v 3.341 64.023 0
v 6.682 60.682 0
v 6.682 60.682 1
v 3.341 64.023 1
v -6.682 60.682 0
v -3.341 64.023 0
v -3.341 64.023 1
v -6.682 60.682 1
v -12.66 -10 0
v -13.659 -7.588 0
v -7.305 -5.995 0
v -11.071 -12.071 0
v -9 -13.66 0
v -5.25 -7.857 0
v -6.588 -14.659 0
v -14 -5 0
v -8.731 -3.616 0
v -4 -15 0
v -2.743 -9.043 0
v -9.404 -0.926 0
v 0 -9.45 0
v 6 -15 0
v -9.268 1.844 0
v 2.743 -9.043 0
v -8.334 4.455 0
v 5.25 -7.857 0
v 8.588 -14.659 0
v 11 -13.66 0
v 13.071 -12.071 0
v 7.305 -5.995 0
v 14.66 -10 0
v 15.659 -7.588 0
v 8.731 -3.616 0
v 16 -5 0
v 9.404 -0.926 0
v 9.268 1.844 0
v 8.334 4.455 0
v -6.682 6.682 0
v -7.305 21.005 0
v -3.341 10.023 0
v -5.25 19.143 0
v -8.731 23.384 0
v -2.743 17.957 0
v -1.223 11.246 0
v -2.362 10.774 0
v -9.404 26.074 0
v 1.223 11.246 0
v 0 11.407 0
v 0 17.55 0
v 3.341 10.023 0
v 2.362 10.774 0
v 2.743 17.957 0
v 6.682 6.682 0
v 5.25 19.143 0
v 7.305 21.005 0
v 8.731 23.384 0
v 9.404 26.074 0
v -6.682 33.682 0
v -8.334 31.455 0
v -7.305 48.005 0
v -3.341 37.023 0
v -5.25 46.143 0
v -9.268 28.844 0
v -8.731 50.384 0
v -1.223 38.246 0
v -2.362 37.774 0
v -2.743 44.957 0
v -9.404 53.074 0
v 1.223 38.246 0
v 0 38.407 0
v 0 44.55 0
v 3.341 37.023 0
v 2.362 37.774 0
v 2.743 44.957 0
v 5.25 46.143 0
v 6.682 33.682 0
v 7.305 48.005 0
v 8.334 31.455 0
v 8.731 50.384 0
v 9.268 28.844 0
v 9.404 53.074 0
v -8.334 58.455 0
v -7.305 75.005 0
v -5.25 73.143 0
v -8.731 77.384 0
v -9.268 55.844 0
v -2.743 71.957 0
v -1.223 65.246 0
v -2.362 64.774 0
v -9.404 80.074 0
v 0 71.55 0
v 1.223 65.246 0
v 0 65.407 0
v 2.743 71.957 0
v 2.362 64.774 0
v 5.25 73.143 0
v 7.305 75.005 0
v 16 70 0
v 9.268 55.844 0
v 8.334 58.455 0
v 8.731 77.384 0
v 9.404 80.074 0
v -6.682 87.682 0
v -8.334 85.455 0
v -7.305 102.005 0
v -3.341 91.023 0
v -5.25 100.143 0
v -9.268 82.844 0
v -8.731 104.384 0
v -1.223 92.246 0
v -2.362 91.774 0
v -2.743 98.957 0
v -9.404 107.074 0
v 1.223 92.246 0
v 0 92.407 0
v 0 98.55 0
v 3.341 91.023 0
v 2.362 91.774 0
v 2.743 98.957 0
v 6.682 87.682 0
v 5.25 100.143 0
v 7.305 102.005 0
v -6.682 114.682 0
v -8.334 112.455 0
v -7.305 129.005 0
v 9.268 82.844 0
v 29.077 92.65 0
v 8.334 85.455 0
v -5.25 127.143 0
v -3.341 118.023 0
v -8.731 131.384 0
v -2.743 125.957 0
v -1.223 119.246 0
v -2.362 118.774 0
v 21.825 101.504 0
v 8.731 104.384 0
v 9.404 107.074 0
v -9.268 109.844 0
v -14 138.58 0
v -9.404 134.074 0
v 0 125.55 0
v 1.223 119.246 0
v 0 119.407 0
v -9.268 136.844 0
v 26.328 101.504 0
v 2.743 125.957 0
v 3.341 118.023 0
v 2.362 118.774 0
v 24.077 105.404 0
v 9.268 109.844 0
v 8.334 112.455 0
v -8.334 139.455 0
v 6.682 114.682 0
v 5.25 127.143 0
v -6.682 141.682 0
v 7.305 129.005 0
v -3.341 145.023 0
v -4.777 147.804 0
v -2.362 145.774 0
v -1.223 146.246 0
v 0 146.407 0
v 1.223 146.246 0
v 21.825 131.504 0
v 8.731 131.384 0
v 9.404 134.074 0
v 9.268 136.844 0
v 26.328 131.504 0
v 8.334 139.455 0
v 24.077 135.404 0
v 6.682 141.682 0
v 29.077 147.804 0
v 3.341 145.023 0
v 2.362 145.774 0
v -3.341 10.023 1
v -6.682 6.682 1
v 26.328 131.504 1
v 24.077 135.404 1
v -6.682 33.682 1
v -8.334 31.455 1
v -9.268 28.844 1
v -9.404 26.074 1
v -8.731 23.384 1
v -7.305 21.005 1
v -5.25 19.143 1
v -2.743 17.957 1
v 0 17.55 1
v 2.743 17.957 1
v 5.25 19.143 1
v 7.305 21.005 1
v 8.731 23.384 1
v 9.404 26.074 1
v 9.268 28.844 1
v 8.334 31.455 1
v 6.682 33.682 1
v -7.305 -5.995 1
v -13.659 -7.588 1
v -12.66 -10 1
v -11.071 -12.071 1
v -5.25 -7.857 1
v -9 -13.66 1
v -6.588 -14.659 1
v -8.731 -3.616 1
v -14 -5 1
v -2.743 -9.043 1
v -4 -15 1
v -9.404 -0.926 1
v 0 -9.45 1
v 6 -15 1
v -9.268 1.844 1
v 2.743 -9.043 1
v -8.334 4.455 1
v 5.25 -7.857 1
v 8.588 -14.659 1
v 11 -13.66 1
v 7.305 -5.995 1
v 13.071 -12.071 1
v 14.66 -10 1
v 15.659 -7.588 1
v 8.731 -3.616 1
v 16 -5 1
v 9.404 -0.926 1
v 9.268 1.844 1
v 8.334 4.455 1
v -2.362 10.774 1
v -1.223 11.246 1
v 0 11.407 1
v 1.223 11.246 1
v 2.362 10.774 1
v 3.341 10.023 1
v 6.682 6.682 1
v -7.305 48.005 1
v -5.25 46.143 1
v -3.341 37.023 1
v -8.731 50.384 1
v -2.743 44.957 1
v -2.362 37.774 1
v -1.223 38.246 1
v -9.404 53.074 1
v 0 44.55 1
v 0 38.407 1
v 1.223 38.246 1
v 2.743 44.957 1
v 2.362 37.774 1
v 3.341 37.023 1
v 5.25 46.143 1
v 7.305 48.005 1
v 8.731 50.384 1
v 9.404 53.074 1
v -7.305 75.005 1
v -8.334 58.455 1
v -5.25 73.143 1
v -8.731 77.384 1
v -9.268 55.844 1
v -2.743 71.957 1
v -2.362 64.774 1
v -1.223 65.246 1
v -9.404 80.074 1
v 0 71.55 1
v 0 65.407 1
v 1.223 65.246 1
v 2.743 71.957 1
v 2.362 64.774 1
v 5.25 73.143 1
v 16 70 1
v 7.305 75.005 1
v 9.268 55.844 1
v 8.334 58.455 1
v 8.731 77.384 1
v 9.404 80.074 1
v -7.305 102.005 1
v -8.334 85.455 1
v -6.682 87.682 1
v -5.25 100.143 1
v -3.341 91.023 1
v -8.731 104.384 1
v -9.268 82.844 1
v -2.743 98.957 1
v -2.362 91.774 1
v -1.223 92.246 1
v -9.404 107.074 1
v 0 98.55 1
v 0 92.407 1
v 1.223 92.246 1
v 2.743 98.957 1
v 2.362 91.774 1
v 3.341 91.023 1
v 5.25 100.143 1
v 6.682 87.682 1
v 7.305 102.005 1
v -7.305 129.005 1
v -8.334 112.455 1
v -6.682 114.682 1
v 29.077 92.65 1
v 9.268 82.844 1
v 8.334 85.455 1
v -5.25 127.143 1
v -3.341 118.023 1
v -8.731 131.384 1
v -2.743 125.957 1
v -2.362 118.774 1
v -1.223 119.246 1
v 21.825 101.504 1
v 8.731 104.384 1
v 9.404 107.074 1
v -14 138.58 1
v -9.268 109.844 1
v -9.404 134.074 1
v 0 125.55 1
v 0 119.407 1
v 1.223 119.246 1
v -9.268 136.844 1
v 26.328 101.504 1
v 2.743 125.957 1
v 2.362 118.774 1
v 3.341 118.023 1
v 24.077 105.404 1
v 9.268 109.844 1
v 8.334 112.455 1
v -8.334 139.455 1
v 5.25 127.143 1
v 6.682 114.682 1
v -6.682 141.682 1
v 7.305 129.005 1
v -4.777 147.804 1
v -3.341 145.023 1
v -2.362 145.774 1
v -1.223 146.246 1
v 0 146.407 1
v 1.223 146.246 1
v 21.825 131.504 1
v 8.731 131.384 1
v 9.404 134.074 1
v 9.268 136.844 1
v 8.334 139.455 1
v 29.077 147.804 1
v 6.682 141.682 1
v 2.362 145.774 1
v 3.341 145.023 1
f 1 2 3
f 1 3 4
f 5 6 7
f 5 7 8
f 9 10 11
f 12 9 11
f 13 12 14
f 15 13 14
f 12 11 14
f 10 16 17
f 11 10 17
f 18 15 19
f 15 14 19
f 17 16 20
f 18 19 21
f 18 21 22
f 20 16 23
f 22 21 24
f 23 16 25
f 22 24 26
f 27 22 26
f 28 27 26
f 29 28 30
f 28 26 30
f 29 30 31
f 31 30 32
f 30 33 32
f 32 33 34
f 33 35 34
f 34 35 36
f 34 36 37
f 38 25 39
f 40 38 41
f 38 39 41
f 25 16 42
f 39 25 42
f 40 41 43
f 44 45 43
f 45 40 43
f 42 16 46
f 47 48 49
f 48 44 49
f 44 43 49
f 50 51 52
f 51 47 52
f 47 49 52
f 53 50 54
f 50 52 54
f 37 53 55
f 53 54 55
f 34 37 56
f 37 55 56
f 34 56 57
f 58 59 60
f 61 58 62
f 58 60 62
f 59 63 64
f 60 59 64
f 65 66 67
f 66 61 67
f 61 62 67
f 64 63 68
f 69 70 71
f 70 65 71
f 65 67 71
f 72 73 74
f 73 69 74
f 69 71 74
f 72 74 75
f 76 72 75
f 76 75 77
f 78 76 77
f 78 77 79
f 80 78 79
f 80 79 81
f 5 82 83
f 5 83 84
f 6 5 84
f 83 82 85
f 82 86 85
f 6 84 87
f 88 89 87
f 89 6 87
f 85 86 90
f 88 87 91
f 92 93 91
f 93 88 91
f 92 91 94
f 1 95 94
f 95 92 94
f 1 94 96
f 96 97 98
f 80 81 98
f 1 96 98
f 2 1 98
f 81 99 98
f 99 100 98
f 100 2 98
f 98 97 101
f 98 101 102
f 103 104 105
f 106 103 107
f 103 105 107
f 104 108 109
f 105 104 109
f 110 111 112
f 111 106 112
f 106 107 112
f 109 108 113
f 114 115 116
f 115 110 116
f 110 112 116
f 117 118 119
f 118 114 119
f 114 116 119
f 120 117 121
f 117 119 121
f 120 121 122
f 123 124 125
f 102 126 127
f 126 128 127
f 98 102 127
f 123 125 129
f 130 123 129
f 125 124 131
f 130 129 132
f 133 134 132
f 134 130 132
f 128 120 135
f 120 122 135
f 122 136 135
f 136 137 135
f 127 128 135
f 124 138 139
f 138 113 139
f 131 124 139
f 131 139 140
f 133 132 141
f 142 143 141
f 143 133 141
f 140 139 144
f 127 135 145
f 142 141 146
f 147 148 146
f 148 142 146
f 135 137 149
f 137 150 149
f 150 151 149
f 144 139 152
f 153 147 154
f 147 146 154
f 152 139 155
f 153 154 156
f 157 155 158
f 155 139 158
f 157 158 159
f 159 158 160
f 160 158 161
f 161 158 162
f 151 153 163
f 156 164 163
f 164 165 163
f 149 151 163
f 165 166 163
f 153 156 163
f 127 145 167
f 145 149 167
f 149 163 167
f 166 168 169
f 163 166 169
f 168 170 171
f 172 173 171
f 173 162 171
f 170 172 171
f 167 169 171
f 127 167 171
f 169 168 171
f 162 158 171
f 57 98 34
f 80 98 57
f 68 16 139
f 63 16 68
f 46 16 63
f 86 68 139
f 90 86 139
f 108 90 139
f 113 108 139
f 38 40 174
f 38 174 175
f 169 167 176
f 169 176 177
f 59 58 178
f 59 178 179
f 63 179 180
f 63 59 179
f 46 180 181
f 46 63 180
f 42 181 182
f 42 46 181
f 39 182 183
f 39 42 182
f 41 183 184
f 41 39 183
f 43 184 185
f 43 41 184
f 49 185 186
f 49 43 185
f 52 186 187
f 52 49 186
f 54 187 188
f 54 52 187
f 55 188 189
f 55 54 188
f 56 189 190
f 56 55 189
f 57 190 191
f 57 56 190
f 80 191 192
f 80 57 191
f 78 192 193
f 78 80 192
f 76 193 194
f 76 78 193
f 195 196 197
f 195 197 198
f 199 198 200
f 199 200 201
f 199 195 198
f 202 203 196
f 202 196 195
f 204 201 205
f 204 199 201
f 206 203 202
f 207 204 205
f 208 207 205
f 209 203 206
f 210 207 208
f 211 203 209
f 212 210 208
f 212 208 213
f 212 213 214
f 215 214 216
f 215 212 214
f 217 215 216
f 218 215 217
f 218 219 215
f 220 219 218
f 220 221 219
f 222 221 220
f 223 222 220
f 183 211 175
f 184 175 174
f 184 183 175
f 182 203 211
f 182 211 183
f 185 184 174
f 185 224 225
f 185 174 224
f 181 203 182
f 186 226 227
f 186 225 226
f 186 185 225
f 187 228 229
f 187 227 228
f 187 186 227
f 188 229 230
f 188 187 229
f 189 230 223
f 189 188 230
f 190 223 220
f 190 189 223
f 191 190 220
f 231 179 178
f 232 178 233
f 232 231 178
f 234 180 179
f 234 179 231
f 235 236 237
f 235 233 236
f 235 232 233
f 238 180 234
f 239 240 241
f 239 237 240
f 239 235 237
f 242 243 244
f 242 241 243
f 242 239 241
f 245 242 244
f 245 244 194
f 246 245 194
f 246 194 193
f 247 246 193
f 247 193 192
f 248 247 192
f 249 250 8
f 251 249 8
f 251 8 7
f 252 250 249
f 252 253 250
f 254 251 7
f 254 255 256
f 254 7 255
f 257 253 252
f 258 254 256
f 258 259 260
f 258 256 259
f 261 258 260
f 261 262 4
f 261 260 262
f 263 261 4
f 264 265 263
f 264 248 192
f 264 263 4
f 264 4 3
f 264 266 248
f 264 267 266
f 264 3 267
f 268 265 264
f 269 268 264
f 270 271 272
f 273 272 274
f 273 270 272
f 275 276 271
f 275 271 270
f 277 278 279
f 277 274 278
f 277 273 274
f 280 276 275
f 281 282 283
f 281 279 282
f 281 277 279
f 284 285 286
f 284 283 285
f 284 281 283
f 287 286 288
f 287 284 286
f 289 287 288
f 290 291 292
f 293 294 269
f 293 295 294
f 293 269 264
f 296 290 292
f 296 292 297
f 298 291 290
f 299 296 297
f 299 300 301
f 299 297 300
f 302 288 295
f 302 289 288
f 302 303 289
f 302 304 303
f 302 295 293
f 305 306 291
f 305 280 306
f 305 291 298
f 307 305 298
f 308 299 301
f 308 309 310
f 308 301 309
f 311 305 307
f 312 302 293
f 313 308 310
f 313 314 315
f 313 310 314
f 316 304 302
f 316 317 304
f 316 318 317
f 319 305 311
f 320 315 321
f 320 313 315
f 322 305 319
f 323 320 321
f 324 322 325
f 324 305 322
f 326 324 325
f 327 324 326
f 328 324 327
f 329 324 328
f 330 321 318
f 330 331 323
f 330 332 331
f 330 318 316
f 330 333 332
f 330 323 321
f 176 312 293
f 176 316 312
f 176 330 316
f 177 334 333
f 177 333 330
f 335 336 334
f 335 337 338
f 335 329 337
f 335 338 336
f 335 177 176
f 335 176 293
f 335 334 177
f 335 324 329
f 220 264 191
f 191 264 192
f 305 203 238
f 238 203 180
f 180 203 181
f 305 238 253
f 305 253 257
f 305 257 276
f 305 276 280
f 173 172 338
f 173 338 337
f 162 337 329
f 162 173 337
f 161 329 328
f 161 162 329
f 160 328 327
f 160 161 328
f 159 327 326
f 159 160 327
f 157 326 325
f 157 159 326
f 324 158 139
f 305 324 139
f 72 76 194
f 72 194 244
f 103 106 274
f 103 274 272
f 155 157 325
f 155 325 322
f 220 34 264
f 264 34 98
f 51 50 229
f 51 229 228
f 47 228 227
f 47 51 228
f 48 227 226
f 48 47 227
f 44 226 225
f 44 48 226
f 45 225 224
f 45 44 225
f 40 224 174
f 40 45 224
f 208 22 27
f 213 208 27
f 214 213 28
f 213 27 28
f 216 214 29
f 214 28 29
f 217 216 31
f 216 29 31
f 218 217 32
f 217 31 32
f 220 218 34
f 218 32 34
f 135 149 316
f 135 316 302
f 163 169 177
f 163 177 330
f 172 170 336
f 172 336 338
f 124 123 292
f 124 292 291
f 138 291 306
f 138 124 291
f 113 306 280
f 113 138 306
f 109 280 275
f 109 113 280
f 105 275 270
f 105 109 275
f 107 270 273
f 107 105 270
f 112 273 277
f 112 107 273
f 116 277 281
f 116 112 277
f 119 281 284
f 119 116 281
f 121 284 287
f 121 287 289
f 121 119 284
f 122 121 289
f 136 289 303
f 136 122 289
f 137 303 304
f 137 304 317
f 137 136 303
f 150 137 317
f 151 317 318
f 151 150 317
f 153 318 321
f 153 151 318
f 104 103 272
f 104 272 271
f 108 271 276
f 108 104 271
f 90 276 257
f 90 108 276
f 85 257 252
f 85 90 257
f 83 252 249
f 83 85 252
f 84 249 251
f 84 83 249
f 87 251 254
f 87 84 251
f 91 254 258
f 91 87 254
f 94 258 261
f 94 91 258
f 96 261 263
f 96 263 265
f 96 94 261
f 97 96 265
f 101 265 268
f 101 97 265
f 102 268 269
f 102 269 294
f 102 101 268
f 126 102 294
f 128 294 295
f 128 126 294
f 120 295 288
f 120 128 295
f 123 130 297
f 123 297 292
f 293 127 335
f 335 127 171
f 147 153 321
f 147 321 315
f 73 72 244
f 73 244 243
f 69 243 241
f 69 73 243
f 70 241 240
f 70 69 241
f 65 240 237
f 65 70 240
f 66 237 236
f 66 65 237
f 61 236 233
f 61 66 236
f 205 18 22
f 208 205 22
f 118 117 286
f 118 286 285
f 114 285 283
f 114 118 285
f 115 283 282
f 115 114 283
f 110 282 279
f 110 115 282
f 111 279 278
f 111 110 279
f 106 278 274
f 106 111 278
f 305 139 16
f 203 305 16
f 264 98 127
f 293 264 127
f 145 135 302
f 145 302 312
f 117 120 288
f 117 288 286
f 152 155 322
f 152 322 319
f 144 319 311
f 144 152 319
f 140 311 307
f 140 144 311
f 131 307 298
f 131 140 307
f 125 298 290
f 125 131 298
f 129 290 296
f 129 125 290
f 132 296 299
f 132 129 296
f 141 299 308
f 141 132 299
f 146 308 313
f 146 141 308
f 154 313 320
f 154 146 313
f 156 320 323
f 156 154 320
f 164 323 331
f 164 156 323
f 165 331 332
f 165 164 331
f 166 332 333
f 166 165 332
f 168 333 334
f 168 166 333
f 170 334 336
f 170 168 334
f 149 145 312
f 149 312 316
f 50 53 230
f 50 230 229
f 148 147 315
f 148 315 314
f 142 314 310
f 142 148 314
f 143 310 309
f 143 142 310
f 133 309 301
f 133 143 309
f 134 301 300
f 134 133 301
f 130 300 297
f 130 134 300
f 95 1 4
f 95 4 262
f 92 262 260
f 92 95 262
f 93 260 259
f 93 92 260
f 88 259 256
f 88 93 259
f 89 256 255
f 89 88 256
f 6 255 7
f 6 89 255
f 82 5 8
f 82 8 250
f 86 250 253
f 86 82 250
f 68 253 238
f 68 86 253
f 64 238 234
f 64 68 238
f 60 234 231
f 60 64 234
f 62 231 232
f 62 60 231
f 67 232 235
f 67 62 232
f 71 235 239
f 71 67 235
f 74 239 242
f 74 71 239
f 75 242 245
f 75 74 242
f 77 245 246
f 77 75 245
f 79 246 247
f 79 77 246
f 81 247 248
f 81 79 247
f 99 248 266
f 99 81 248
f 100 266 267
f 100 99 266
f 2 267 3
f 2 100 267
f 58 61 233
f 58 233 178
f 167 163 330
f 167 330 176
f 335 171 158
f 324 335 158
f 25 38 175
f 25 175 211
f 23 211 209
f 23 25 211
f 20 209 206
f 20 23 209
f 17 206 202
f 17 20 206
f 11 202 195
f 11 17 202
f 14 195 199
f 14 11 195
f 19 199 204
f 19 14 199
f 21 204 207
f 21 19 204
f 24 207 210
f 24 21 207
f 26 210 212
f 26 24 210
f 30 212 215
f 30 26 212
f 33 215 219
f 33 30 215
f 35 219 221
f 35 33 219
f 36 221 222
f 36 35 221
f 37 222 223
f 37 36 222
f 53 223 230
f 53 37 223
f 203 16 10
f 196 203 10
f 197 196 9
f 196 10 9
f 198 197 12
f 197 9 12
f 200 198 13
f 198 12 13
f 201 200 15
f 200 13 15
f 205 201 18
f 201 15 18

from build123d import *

# Parameters (mm, degrees)
EXTRUDE_1_DEPTH = 1


with BuildPart() as part:
    # 草图1 → 凸台-拉伸1 (new body)
    with BuildSketch(Plane.XY):
        with BuildLine():
            Line((-4, -15), (6, -15))
            ThreePointArc((6, -15), (13.071067812, -12.071067812), (16, -5))
            Line((16, -5), (16, 70))
            Line((16, 70), (29.076696831, 92.649503306))
            Line((29.076696831, 92.649503306), (29.076696831, 147.803847577))
            Line((29.076696831, 147.803847577), (-4.776615382, 147.803847577))
            Line((-4.776615382, 147.803847577), (-14, 138.58046296))
            Line((-14, 138.58046296), (-14, -5))
            ThreePointArc((-14, -5), (-11.071067812, -12.071067812), (-4, -15))
        make_face()
        with BuildLine():
            ThreePointArc((-6.682159082, 114.682159082), (0, 98.55), (6.682159082, 114.682159082))
            Line((6.682159082, 114.682159082), (3.341079541, 118.023238623))
            ThreePointArc((3.341079541, 118.023238623), (0, 119.407159082), (-3.341079541, 118.023238623))
            Line((-3.341079541, 118.023238623), (-6.682159082, 114.682159082))
        make_face(mode=Mode.SUBTRACT)
        with BuildLine():
            ThreePointArc((-6.682159082, 141.682159082), (0, 125.55), (6.682159082, 141.682159082))
            Line((6.682159082, 141.682159082), (3.341079541, 145.023238623))
            ThreePointArc((3.341079541, 145.023238623), (0, 146.407159082), (-3.341079541, 145.023238623))
            Line((-3.341079541, 145.023238623), (-6.682159082, 141.682159082))
        make_face(mode=Mode.SUBTRACT)
        with BuildLine():
            ThreePointArc((-6.682159082, 87.682159082), (0, 71.55), (6.682159082, 87.682159082))
            Line((6.682159082, 87.682159082), (3.341079541, 91.023238623))
            ThreePointArc((3.341079541, 91.023238623), (0, 92.407159082), (-3.341079541, 91.023238623))
            Line((-3.341079541, 91.023238623), (-6.682159082, 87.682159082))
        make_face(mode=Mode.SUBTRACT)
        with BuildLine():
            ThreePointArc((3.341079541, 64.023238623), (0, 65.407159082), (-3.341079541, 64.023238623))
            Line((-3.341079541, 64.023238623), (-6.682159082, 60.682159082))
            ThreePointArc((-6.682159082, 60.682159082), (0, 44.55), (6.682159082, 60.682159082))
            Line((6.682159082, 60.682159082), (3.341079541, 64.023238623))
        make_face(mode=Mode.SUBTRACT)
        with BuildLine():
            ThreePointArc((-6.682159082, 33.682159082), (0, 17.55), (6.682159082, 33.682159082))
            Line((6.682159082, 33.682159082), (3.341079541, 37.023238623))
            ThreePointArc((3.341079541, 37.023238623), (0, 38.407159082), (-3.341079541, 37.023238623))
            Line((-3.341079541, 37.023238623), (-6.682159082, 33.682159082))
        make_face(mode=Mode.SUBTRACT)
        with BuildLine():
            ThreePointArc((3.341079541, 10.023238623), (0, 11.407159082), (-3.341079541, 10.023238623))
            Line((-3.341079541, 10.023238623), (-6.682159082, 6.682159082))
            ThreePointArc((-6.682159082, 6.682159082), (0, -9.45), (6.682159082, 6.682159082))
            Line((6.682159082, 6.682159082), (3.341079541, 10.023238623))
        make_face(mode=Mode.SUBTRACT)
        Polygon((24.076696831, 105.403847577), (21.825030781, 101.503847577), (26.32836288, 101.503847577), align=None, mode=Mode.SUBTRACT)
        Polygon((26.32836288, 131.503847577), (24.076696831, 135.403847577), (21.825030781, 131.503847577), align=None, mode=Mode.SUBTRACT)
    extrude(amount=EXTRUDE_1_DEPTH)


solid = part.part
